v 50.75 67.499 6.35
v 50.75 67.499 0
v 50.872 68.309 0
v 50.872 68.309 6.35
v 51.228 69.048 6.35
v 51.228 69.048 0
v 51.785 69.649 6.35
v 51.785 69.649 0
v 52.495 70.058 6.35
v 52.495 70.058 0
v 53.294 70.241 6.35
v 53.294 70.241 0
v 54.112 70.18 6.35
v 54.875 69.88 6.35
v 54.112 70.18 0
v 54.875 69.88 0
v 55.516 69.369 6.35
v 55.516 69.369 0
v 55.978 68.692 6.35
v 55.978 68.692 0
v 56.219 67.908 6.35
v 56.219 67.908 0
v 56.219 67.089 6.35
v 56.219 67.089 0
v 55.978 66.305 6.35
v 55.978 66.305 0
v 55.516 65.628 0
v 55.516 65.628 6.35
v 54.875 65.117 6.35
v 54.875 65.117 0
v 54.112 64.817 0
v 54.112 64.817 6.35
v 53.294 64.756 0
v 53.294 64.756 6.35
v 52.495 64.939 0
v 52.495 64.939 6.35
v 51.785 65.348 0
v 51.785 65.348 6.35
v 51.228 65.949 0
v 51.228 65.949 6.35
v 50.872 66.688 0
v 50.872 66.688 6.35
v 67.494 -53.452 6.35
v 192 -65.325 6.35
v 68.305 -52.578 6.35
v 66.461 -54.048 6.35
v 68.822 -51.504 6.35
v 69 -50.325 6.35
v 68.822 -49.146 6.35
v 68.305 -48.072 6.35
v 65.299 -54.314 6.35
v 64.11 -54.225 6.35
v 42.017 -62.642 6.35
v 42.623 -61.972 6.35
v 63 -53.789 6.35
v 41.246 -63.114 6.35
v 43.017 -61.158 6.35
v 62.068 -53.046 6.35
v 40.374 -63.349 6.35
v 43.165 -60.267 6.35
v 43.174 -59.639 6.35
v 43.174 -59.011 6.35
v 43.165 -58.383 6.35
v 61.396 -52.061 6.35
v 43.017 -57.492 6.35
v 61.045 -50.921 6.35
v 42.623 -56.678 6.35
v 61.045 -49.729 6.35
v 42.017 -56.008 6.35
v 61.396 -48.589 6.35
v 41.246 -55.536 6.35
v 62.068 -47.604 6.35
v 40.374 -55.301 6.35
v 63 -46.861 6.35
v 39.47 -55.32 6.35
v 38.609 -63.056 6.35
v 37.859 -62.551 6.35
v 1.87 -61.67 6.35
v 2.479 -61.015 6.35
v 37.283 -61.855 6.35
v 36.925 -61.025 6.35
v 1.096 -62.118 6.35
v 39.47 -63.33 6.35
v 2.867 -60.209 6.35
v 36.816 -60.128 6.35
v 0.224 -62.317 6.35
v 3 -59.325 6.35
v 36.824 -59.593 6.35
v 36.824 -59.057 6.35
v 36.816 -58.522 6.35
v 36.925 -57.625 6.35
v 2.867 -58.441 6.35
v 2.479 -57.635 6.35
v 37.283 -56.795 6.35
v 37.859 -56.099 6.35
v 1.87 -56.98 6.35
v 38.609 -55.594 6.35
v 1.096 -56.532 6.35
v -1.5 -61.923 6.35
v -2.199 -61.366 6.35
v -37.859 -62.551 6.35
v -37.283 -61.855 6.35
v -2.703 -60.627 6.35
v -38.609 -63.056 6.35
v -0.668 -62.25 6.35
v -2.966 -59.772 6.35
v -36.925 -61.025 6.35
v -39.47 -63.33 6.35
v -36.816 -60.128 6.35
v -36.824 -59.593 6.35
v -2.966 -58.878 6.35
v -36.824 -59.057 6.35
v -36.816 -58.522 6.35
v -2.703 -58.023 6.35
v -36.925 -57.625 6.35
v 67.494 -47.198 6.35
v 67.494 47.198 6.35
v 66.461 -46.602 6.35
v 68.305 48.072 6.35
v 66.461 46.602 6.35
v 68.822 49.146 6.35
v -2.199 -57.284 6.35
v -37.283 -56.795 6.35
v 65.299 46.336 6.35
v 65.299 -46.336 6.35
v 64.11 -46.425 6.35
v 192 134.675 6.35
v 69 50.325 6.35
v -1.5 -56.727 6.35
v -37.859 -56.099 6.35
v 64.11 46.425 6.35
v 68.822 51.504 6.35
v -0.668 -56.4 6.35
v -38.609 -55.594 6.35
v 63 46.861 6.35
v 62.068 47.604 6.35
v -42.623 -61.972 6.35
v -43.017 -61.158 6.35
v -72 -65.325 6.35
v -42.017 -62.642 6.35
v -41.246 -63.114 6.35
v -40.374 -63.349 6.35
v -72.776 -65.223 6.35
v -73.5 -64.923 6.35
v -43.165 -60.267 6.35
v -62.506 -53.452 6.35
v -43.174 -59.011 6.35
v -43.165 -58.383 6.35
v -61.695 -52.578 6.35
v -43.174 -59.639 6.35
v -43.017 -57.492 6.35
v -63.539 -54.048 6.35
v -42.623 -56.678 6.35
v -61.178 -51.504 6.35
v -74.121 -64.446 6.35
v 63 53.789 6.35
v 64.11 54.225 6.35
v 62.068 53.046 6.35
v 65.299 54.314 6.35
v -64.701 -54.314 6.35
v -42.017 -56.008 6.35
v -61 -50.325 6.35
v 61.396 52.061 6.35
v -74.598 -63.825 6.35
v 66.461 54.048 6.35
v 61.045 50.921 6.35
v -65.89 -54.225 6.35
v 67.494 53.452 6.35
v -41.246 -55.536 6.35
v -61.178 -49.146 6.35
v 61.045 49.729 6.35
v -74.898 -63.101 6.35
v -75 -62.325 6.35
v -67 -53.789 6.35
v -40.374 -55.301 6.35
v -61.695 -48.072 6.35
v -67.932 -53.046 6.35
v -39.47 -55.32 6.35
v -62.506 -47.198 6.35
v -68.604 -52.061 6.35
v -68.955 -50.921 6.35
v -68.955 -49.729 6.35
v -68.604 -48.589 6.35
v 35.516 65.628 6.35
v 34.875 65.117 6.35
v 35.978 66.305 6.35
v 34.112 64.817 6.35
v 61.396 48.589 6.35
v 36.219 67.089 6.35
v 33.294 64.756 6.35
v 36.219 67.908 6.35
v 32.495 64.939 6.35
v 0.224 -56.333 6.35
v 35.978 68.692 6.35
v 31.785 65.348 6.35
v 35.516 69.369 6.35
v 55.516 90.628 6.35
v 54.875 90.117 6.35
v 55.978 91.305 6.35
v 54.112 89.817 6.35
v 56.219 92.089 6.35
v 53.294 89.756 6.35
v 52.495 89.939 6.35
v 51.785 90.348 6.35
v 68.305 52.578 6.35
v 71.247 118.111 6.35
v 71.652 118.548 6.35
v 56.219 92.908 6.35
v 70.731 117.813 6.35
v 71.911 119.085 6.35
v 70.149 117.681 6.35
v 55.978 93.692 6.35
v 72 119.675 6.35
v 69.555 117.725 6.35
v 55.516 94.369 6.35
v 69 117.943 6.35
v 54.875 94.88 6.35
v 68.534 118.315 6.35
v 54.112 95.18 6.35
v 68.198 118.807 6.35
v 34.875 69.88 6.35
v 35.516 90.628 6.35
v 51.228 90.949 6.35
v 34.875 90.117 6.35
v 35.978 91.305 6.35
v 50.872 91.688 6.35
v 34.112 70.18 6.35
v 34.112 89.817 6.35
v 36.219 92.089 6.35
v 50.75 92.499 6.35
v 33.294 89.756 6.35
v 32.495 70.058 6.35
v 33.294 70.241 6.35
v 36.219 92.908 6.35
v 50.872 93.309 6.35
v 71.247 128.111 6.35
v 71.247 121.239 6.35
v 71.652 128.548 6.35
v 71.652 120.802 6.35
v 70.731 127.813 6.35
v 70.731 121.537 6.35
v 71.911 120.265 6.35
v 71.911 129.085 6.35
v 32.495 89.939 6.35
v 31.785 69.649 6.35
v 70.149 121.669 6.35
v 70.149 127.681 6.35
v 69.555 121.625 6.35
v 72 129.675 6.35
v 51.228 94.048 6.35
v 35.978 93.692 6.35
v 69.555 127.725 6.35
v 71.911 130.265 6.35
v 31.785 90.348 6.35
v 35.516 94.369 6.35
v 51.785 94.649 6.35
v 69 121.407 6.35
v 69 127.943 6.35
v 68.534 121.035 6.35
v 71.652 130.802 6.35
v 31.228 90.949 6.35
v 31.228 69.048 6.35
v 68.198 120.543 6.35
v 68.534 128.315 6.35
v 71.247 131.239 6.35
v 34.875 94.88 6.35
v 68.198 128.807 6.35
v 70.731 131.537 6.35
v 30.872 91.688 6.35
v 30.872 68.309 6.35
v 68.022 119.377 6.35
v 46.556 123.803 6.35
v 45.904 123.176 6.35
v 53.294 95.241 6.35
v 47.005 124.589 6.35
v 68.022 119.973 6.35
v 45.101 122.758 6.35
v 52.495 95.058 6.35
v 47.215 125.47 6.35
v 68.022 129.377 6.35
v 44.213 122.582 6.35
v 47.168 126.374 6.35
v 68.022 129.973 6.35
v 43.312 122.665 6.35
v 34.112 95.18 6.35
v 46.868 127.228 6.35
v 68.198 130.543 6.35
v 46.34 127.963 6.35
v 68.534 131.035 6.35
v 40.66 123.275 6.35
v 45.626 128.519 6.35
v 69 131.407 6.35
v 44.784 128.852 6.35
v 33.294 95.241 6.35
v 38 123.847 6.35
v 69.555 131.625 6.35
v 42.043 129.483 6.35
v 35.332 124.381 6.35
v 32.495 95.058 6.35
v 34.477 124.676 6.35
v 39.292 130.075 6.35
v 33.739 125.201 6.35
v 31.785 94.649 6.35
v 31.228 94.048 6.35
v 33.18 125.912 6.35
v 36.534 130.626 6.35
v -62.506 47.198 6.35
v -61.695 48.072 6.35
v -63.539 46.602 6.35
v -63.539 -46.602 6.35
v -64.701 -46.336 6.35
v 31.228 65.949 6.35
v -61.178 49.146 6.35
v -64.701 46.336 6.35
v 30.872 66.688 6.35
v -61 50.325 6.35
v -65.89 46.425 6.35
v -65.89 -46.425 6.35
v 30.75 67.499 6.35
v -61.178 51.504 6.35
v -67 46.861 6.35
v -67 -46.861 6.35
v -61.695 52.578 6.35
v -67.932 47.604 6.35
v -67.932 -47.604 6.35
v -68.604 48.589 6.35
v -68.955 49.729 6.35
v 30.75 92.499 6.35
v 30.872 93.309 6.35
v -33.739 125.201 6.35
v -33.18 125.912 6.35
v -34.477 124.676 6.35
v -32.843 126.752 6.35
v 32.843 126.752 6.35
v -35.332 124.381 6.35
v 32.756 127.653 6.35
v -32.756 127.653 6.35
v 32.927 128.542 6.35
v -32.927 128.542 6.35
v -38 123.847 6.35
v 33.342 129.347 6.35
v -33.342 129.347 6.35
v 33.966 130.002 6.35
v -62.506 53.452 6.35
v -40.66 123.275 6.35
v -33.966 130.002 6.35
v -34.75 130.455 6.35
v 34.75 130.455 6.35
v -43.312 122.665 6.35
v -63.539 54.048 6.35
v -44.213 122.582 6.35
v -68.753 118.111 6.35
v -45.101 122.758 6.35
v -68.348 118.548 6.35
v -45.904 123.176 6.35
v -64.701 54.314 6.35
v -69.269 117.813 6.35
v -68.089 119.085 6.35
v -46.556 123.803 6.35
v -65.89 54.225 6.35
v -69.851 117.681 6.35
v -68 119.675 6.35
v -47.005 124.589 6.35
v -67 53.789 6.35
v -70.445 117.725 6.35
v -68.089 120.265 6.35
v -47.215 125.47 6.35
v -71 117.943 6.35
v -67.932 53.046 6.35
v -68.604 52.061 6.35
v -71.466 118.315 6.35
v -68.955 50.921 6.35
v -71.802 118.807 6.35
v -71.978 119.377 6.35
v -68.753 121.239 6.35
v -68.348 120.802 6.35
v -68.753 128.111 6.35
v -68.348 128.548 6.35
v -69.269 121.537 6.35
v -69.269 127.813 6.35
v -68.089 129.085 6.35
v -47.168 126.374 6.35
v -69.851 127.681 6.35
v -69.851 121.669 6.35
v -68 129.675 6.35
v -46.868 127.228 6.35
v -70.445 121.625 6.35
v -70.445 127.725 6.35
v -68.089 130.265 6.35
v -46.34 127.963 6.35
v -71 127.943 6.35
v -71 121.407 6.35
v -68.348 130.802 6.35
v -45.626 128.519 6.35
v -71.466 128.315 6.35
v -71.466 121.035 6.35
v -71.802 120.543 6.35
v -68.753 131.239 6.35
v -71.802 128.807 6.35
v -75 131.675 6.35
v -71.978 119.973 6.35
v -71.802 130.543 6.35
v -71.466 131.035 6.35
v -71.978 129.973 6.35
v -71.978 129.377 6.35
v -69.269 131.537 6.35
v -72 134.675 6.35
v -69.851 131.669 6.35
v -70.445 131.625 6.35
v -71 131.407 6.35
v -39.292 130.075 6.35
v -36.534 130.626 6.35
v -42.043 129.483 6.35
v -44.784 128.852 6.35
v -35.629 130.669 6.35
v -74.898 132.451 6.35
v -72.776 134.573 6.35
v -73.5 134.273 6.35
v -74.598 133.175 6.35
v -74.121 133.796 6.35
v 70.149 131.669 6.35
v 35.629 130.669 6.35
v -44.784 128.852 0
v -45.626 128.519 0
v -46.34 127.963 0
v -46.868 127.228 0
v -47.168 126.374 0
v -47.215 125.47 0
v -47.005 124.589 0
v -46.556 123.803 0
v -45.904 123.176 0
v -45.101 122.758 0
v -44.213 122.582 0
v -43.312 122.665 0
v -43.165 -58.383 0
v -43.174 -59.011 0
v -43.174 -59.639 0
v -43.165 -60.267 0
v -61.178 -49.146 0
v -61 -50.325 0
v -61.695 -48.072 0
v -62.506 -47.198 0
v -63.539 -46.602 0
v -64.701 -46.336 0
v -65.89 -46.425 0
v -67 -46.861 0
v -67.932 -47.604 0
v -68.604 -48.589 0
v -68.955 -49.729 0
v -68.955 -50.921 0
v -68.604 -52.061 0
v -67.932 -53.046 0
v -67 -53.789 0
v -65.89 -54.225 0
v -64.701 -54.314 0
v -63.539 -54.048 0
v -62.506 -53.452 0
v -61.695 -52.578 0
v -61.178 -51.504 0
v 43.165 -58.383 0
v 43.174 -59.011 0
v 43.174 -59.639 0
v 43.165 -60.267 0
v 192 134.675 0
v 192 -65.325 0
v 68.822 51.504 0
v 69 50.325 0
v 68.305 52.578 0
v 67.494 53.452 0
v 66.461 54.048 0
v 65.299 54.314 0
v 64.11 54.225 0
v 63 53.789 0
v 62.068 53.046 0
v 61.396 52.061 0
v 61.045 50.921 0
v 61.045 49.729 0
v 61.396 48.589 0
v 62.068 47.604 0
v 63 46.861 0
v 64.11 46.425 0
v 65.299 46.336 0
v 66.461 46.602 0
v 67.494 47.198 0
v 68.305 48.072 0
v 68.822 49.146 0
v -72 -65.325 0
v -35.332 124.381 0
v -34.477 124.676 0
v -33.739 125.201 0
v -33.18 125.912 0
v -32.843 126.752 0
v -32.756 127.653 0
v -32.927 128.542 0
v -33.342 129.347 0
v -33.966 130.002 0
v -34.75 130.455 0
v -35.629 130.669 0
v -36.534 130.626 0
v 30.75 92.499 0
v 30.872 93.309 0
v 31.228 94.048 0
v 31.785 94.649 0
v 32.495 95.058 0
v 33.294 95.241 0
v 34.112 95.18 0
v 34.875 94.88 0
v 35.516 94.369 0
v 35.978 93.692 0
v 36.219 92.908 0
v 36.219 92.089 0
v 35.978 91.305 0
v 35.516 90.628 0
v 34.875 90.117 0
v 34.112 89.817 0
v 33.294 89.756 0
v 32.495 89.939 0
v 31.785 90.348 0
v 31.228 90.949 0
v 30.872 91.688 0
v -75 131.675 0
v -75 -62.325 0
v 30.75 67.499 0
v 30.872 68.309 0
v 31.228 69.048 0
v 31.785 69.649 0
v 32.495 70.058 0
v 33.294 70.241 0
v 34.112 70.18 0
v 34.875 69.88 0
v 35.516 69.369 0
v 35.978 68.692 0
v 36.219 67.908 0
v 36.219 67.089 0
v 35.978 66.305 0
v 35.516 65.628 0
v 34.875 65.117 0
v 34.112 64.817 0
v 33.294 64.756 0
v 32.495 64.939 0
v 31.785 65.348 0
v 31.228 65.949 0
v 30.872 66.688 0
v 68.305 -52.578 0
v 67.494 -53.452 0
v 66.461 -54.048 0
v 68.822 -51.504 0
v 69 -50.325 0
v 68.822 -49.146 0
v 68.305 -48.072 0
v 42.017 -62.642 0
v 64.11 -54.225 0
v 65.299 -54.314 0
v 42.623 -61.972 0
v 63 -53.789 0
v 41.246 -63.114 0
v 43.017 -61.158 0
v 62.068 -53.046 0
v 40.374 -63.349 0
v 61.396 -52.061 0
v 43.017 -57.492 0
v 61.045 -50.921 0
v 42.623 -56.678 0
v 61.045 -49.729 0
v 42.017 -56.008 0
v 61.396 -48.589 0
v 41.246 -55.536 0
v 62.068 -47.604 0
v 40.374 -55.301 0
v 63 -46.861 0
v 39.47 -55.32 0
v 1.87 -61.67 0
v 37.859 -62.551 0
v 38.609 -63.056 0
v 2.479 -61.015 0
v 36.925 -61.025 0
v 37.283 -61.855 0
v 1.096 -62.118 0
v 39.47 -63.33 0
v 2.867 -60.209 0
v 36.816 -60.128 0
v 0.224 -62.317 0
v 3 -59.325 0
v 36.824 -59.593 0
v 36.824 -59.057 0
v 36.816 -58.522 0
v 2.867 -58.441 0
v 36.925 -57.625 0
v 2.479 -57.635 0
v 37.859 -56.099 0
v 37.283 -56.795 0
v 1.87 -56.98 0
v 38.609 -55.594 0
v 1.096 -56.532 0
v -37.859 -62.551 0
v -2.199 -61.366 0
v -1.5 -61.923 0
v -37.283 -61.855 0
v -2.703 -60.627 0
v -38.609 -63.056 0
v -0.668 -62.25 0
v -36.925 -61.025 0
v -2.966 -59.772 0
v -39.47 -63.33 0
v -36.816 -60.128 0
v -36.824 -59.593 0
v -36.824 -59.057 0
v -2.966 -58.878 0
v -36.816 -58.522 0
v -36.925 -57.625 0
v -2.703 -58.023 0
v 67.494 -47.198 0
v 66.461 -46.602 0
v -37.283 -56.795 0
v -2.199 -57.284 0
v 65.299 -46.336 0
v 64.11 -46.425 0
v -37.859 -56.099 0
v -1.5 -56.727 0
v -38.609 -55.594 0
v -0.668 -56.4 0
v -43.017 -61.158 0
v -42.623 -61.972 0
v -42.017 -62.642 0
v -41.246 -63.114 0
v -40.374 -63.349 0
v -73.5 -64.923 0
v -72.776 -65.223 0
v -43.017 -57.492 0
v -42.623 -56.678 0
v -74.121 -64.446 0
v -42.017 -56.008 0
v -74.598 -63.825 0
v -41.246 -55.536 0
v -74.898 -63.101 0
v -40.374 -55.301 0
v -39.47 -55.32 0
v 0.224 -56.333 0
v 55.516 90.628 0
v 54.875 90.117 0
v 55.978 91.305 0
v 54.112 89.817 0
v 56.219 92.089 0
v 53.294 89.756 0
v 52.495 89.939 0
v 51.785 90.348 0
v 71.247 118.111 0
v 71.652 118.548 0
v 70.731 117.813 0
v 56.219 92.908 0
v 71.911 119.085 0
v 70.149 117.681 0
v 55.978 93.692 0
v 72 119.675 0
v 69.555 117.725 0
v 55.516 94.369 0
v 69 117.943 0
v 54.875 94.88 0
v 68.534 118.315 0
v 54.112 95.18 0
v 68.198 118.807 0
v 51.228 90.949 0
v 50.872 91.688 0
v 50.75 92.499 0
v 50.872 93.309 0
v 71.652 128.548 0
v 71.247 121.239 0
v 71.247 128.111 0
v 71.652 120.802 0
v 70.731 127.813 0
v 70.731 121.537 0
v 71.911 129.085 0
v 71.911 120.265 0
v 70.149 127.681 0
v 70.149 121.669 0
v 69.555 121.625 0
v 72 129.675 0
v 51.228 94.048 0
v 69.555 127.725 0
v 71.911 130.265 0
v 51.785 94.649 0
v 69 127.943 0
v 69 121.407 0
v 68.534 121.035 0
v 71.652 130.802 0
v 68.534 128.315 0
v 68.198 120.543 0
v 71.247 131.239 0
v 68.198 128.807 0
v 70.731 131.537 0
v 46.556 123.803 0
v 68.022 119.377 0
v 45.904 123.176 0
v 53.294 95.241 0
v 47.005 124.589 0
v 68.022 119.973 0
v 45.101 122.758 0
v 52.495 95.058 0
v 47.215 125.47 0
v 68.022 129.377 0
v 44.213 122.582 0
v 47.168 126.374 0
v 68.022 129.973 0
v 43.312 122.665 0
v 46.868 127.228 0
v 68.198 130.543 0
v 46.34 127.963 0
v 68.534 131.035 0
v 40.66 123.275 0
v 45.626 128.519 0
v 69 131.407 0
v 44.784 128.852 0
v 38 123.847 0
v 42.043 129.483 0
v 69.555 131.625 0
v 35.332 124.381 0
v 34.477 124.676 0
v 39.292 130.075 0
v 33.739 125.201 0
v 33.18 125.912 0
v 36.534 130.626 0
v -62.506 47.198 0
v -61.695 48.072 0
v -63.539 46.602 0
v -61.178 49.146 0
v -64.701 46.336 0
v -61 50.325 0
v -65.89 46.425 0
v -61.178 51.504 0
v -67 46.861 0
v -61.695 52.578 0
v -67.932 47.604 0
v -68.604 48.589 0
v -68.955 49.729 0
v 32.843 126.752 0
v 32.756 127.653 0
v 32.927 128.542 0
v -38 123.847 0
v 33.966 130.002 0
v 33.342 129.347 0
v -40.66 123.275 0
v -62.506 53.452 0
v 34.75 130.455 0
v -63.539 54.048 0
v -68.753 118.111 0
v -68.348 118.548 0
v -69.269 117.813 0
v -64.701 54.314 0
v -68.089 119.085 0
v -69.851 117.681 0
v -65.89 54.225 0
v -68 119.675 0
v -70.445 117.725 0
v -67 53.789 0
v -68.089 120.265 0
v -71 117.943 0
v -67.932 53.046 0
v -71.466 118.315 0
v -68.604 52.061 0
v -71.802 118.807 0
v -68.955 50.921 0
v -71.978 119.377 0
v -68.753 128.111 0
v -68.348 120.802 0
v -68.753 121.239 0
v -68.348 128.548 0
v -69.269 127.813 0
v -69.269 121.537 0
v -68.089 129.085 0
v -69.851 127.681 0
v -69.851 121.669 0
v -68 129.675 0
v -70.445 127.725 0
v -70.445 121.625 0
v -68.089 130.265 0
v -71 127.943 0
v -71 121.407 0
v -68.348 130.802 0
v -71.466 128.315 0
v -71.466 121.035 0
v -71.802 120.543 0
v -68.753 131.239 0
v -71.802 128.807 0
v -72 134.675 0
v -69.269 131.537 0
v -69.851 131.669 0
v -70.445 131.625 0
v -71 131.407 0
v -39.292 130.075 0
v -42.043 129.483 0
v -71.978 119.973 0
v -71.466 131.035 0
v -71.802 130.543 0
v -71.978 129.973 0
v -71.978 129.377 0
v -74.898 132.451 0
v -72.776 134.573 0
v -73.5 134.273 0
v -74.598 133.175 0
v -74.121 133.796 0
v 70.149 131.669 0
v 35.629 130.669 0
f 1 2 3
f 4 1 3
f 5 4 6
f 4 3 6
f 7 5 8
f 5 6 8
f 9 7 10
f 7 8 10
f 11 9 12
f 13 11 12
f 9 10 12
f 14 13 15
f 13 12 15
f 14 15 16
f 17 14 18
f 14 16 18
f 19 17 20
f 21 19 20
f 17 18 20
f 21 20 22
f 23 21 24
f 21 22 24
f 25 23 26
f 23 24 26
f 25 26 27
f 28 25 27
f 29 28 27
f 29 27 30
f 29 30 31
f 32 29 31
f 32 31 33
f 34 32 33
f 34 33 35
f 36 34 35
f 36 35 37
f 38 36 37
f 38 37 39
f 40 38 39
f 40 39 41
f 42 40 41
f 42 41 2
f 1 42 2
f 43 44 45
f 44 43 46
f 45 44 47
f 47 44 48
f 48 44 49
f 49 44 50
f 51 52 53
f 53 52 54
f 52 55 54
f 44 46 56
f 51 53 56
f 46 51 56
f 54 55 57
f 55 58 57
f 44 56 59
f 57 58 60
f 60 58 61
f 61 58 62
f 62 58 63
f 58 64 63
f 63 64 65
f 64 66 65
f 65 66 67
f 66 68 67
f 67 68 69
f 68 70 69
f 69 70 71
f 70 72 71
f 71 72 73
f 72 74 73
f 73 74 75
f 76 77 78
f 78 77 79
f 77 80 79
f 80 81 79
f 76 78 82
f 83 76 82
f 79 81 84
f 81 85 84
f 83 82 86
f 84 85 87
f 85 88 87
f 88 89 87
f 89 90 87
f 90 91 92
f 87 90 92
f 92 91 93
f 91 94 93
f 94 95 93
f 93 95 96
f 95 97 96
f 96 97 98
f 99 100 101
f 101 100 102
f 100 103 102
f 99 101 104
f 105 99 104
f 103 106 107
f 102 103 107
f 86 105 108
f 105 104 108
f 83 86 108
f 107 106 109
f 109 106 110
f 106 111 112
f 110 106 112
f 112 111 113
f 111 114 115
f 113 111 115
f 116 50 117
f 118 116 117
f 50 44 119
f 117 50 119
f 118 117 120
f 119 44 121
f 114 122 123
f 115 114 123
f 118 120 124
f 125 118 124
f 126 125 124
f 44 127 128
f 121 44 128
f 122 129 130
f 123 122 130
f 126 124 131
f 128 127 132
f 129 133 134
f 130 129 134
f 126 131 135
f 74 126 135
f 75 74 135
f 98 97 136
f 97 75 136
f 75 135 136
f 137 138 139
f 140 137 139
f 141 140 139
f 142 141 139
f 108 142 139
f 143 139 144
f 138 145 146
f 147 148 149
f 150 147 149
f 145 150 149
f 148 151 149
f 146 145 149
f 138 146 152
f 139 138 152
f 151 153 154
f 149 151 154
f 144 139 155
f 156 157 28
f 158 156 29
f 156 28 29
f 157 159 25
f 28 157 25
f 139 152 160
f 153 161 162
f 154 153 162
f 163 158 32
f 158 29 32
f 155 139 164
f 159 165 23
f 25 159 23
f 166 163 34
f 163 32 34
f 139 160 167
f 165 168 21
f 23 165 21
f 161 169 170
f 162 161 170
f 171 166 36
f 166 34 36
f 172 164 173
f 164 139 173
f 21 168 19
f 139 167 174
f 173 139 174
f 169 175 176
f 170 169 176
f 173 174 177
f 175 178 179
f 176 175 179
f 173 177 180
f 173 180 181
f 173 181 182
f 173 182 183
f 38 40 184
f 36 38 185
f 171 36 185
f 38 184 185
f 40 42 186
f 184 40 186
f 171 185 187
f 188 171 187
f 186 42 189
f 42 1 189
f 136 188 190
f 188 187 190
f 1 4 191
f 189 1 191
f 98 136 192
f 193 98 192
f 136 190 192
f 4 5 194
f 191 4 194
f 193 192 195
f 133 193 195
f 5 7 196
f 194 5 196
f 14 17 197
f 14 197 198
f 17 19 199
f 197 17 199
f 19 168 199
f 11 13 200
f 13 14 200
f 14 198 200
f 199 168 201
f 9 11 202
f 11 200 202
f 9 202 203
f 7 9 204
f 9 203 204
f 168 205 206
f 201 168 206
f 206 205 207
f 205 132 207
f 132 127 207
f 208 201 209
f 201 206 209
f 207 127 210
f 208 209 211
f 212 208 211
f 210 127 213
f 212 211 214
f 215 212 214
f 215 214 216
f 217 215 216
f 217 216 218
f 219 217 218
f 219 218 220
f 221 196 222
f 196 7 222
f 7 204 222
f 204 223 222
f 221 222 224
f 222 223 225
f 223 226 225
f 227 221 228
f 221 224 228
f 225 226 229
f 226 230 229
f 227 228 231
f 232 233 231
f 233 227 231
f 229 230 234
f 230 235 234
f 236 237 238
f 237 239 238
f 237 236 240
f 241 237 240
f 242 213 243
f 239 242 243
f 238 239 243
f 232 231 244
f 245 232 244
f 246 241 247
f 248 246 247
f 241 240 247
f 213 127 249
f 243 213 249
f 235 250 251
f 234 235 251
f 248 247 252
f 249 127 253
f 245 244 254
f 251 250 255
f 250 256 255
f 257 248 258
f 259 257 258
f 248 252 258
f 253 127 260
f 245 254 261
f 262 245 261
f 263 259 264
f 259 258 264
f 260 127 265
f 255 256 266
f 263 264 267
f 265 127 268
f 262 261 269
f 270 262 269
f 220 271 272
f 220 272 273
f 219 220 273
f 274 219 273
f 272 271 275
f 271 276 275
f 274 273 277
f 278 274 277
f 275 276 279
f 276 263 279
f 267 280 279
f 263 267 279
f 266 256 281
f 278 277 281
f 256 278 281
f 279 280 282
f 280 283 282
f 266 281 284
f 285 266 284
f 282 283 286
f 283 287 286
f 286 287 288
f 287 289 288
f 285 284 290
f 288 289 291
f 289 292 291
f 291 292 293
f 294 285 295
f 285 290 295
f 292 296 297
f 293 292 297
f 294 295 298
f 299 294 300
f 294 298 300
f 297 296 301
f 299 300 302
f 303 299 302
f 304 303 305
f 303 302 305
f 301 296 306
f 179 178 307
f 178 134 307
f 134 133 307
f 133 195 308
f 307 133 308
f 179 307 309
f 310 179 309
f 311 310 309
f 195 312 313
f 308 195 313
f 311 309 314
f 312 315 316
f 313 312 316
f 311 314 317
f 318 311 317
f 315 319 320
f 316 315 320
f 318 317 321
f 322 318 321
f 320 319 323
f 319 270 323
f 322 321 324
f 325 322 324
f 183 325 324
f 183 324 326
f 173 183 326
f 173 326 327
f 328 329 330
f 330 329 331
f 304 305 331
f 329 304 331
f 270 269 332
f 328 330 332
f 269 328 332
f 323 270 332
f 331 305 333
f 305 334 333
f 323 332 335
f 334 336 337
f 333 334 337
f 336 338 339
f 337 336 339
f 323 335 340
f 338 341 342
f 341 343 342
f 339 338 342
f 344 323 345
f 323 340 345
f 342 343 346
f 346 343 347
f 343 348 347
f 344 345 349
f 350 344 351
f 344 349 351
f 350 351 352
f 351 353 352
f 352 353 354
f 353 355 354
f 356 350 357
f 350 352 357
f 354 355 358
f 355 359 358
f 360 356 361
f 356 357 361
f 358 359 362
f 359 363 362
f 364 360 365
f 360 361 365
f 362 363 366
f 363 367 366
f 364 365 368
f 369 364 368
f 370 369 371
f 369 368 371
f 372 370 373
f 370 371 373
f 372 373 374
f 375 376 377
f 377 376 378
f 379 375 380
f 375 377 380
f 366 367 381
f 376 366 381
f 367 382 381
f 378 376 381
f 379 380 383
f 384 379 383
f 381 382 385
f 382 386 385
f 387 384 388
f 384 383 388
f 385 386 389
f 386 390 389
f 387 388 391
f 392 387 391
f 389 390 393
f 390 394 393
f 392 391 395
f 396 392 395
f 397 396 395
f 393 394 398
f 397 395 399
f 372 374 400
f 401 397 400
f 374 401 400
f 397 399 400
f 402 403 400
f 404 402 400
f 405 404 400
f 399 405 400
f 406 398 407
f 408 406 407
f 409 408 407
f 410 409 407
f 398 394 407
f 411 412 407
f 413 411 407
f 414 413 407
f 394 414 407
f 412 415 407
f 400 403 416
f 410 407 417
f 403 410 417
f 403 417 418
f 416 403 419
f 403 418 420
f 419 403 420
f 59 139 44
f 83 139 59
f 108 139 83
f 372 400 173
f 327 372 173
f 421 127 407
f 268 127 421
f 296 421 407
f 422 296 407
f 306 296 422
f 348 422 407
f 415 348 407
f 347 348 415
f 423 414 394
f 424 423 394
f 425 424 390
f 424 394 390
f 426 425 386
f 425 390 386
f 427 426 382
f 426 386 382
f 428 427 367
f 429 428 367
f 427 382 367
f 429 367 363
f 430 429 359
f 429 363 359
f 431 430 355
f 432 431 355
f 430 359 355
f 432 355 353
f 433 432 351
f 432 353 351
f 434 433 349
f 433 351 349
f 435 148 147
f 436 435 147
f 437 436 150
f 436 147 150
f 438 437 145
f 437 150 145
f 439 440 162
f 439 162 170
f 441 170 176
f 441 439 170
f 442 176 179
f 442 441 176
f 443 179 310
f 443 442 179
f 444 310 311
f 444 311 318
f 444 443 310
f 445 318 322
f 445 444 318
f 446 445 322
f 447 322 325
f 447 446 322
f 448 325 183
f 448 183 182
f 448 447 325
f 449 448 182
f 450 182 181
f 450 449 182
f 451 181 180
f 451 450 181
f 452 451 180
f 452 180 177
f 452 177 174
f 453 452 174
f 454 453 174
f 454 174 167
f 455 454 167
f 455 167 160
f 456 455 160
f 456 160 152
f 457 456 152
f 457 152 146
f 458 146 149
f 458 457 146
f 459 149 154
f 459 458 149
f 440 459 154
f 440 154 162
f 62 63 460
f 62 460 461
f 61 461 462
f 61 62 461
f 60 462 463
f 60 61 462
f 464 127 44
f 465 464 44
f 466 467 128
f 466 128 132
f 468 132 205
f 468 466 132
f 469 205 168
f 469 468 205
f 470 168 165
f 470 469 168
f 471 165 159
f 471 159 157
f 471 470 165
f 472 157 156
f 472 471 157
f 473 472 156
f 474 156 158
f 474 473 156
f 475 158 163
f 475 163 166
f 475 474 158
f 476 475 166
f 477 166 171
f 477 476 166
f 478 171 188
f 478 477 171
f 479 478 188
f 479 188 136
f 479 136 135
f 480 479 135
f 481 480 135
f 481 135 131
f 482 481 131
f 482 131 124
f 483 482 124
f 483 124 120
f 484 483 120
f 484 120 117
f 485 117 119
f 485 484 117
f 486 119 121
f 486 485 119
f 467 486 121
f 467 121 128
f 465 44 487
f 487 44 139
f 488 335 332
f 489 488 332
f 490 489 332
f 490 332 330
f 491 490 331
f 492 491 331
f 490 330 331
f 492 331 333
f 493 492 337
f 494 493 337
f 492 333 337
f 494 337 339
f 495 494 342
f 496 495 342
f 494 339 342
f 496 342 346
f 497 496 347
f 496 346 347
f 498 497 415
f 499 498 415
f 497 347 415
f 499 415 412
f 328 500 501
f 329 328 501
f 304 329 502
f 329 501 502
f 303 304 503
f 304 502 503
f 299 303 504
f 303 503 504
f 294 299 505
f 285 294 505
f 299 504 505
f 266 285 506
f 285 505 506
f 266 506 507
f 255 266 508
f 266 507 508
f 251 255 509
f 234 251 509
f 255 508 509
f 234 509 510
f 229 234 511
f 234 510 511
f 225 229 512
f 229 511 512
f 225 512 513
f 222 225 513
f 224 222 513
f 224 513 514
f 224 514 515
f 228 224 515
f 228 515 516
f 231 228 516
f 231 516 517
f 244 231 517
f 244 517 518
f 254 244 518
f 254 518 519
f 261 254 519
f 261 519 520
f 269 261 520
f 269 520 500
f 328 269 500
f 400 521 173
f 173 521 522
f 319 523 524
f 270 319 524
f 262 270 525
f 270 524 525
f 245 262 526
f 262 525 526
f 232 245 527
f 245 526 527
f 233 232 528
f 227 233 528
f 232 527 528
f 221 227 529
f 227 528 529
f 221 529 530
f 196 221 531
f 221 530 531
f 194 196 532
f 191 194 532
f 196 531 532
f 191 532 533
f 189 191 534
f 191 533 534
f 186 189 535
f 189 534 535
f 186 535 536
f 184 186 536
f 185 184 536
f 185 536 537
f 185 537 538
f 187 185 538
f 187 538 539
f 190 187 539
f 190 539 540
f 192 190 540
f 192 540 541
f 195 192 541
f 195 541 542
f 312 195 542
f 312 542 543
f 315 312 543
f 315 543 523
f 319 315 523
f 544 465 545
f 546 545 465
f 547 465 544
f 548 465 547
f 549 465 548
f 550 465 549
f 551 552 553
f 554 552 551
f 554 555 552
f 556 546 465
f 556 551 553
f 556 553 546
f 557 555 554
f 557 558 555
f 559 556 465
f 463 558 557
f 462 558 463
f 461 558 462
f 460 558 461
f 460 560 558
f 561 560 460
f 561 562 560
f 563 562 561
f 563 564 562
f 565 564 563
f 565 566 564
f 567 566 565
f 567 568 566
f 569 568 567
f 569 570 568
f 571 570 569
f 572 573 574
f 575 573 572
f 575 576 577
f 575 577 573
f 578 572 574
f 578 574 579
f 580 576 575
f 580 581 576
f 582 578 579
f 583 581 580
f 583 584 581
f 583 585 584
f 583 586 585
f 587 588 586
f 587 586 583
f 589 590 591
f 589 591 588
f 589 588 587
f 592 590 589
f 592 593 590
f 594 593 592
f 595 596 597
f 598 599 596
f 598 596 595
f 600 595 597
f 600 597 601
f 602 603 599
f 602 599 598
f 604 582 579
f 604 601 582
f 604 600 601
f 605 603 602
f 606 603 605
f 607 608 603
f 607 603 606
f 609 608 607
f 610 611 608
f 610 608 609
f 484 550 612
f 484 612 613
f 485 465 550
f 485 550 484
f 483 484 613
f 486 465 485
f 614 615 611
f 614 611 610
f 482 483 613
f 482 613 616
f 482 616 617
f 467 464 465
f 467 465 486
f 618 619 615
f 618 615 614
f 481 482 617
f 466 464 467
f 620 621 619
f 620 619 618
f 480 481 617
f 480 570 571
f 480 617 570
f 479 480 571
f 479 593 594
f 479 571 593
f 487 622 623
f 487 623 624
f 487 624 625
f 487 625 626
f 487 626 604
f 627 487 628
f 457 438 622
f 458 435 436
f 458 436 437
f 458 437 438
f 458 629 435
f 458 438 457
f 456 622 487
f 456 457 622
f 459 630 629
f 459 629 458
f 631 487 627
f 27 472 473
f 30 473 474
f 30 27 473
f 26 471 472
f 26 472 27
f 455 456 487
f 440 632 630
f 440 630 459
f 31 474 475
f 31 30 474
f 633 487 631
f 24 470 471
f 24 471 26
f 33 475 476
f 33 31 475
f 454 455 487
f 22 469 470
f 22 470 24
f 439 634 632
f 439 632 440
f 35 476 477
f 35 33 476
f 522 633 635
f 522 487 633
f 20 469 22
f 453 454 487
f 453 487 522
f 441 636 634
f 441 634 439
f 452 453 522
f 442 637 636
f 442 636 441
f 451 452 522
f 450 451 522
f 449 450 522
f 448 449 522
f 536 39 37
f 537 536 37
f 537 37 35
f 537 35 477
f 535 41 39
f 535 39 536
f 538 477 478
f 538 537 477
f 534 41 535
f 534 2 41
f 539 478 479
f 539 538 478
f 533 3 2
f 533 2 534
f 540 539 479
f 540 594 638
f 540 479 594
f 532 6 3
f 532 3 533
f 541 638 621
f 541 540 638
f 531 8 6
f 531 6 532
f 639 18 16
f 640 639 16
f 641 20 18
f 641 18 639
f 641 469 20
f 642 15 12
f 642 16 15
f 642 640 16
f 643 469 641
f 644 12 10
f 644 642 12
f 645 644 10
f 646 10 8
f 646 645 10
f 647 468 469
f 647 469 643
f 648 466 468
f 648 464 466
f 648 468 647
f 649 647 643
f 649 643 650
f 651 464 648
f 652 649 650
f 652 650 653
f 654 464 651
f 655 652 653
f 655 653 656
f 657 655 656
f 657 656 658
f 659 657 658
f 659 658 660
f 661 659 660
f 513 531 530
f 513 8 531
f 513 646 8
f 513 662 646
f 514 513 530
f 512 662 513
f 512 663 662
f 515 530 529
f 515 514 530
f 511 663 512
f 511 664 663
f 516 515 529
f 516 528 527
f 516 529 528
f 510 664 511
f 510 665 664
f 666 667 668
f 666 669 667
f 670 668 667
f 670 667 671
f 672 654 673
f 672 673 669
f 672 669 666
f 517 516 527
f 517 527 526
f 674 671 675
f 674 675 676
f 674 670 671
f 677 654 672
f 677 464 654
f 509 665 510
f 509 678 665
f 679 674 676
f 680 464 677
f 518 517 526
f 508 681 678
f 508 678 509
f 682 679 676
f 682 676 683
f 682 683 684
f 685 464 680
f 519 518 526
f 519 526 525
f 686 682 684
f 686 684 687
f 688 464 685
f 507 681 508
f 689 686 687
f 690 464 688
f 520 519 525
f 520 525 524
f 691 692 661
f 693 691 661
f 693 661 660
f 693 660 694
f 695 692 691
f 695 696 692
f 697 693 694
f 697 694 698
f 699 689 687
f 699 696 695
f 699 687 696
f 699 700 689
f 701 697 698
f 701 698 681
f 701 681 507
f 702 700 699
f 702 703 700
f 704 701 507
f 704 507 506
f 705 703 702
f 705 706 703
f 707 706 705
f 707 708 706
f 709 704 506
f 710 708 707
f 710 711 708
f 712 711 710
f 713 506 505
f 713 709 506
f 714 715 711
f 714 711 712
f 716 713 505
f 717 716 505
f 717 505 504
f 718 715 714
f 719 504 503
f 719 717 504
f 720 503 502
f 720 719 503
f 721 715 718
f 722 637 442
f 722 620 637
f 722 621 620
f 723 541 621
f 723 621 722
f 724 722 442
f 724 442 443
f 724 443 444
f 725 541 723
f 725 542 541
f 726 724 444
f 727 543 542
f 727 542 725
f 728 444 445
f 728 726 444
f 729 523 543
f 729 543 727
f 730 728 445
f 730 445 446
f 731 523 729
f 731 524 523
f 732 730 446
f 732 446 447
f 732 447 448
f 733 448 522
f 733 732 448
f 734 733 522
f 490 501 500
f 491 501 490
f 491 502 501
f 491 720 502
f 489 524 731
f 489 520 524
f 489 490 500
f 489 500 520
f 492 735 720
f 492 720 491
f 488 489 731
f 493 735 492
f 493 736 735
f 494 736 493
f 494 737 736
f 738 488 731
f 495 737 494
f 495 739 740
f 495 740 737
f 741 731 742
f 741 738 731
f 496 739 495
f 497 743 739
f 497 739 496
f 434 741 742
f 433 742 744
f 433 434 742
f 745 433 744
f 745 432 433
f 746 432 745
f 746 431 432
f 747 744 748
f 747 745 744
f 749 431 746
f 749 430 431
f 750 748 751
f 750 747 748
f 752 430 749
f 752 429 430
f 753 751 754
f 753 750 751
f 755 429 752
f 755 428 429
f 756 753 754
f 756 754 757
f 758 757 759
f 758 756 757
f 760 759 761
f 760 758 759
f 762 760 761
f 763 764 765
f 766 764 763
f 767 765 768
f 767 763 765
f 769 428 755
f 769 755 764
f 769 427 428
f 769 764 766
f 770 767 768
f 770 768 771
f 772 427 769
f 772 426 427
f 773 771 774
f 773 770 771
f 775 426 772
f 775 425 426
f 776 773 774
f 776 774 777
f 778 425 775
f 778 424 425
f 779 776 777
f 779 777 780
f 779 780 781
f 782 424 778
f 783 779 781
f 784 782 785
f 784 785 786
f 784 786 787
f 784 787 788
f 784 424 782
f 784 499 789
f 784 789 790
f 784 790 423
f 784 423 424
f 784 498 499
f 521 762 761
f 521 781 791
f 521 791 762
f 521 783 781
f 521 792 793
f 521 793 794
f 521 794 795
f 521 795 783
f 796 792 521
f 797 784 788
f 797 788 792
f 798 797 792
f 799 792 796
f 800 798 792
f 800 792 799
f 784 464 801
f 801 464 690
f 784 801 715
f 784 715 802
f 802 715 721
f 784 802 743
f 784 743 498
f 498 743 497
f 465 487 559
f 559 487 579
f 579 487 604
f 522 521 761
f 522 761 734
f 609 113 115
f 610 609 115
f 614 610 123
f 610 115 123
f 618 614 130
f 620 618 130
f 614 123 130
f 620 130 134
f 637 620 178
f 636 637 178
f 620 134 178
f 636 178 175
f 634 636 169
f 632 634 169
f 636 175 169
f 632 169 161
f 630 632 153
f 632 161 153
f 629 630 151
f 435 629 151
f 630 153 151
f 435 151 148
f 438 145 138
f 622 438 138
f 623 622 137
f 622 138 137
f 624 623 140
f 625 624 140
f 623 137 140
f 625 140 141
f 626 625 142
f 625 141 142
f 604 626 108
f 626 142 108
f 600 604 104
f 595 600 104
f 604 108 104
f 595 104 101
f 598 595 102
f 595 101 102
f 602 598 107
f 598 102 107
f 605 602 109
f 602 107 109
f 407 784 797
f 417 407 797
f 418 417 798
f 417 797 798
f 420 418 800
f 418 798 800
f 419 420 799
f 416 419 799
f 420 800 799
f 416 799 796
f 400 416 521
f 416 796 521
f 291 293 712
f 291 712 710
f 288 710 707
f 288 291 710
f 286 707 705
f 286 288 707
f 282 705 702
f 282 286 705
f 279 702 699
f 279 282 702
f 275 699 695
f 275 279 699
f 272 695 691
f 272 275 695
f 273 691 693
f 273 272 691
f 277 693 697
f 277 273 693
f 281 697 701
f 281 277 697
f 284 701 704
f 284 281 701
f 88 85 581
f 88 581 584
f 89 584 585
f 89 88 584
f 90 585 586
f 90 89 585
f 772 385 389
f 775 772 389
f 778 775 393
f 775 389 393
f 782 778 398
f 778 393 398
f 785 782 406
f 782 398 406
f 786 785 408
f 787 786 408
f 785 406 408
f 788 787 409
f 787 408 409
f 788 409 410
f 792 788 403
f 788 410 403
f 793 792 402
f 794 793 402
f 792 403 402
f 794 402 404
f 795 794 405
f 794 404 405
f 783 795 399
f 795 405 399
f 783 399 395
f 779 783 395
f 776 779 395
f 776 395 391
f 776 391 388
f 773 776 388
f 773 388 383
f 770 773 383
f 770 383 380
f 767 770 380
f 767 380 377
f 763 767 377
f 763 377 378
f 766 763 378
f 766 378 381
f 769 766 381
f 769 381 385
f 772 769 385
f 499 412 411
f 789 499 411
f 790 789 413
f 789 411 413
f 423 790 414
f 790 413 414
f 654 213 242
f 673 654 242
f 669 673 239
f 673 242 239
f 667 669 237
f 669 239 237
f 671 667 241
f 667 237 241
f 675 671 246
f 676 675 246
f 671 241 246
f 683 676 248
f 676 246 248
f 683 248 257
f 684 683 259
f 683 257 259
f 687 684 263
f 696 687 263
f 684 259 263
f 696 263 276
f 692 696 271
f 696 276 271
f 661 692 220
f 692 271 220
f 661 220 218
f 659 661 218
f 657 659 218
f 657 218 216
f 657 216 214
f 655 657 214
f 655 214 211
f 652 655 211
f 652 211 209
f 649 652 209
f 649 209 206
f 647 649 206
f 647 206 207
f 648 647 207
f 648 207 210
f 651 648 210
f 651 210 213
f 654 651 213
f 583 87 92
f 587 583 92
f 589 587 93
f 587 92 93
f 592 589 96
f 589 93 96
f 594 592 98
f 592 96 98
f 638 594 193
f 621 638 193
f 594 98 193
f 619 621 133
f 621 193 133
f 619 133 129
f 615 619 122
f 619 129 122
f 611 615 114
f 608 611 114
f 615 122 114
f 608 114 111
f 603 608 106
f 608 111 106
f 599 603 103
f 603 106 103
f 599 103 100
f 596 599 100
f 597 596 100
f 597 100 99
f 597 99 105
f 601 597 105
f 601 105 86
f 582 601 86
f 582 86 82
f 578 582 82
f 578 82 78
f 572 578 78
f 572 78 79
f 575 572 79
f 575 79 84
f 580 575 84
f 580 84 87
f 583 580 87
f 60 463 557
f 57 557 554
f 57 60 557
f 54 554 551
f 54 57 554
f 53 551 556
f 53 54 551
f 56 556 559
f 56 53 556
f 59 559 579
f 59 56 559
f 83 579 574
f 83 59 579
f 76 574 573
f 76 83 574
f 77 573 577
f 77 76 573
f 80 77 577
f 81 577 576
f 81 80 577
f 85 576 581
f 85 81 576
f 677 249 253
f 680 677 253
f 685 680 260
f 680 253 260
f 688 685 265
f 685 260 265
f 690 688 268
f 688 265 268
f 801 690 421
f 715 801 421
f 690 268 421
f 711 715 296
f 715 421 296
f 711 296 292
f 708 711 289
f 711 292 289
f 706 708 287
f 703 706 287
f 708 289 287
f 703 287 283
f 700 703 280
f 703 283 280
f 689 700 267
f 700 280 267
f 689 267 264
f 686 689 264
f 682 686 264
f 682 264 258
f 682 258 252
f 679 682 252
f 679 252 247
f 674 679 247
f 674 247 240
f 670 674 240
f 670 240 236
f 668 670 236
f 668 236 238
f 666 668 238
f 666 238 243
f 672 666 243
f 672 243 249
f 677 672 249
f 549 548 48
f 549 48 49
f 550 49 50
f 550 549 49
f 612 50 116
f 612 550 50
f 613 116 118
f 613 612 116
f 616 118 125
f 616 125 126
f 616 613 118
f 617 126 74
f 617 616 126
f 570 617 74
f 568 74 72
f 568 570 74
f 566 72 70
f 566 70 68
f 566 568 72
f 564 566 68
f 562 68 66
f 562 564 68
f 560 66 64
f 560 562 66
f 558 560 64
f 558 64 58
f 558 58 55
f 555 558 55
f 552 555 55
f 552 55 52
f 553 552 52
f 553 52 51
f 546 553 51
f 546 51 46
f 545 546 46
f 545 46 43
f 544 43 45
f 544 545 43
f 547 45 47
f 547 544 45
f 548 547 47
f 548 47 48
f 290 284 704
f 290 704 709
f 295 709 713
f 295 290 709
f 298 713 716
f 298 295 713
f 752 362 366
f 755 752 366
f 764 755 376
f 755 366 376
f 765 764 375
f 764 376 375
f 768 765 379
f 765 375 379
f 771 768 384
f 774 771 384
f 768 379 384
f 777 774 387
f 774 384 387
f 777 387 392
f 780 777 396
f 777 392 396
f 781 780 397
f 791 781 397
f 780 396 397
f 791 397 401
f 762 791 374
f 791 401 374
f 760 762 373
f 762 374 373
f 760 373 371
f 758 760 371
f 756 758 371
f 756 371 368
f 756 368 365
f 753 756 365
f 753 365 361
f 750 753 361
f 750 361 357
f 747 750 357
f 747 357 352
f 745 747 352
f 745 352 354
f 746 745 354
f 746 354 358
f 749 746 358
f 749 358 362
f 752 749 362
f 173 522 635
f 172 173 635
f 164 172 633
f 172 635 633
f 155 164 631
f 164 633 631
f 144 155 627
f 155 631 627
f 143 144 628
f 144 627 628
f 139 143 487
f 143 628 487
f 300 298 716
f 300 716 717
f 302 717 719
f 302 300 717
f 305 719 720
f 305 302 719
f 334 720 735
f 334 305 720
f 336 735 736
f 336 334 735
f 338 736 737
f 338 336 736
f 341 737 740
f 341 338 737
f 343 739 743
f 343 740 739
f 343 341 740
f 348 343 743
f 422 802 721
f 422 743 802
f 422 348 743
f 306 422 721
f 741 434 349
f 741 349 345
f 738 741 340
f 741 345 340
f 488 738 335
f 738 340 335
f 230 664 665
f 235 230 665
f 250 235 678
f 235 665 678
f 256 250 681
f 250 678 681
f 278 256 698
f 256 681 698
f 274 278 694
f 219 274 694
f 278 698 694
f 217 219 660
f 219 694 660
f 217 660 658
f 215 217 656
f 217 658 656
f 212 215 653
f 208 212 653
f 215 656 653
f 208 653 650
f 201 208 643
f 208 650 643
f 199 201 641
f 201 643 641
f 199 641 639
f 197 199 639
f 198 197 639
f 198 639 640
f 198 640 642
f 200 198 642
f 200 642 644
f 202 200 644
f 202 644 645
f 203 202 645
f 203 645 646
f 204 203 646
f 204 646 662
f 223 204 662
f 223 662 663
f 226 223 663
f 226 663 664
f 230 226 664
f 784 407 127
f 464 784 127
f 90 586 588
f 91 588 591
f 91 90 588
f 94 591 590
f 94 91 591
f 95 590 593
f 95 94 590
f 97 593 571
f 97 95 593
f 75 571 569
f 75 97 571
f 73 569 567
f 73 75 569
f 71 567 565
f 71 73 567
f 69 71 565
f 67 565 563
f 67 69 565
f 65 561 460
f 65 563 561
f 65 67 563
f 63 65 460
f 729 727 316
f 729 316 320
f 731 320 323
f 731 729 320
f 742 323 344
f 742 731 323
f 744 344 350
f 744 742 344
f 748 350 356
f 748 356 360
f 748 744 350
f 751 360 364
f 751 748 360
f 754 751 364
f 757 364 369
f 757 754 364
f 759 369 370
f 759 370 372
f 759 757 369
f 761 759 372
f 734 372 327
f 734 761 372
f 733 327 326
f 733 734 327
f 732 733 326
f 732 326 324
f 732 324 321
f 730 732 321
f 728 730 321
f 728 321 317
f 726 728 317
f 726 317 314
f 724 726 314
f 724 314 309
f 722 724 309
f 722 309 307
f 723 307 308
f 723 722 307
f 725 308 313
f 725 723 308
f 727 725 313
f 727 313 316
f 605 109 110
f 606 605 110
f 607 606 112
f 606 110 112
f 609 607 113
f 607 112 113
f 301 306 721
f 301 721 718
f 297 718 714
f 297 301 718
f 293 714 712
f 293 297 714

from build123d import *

# Parameters (mm, degrees)
SKETCH1_R           = 4
BOSS_EXTRUDE1_DEPTH = 6.35
SKETCH2_R           = 3
CUT_EXTRUDE1_DEPTH  = 10
SKETCH3_R           = 2
CUT_EXTRUDE2_DEPTH  = 7.35
SKETCH4_R           = 2.75
CUT_EXTRUDE3_DEPTH  = 10
BOSS_EXTRUDE2_DEPTH = 6.35


with BuildPart() as part:
    # Sketch1 → Boss-Extrude1 (new body)
    with BuildSketch(Plane.XY):
        with BuildLine():
            Line((72, 134.675), (-72, 134.675))
            ThreePointArc((-72, 134.675), (-74.121320344, 133.796320344), (-75, 131.675))
            Line((-75, 131.675), (-75, -62.325))
            ThreePointArc((-75, -62.325), (-74.121320344, -64.446320344), (-72, -65.325))
            Line((-72, -65.325), (72, -65.325))
            ThreePointArc((72, -65.325), (74.121320344, -64.446320344), (75, -62.325))
            Line((75, -62.325), (75, 131.675))
            ThreePointArc((75, 131.675), (74.121320344, 133.796320344), (72, 134.675))
        make_face()
        with Locations((-65, 50.325)):
            Circle(SKETCH1_R, mode=Mode.SUBTRACT)
        with Locations((-65, -50.325)):
            Circle(SKETCH1_R, mode=Mode.SUBTRACT)
        with Locations((65, -50.325)):
            Circle(SKETCH1_R, mode=Mode.SUBTRACT)
        with Locations((65, 50.325)):
            Circle(SKETCH1_R, mode=Mode.SUBTRACT)
    extrude(amount=BOSS_EXTRUDE1_DEPTH)

    # Sketch2 → Cut-Extrude1 (cut)
    with BuildSketch(Plane.XY.offset(6.35)):
        with Locations((0, -59.325)):
            Circle(SKETCH2_R)
        with BuildLine():
            ThreePointArc((-36.53351789, 130.62609934), (-40.668585297, 129.78392163), (-44.784296659, 128.851738315))
            ThreePointArc((-44.784296659, 128.851738315), (-47.141646379, 125.021894676), (-43.31180274, 122.664544956))
            ThreePointArc((-43.31180274, 122.664544956), (-39.331414703, 123.56607837), (-35.332307043, 124.380565536))
            ThreePointArc((-35.332307043, 124.380565536), (-32.810145565, 128.103937862), (-36.53351789, 130.62609934))
        make_face()
        with BuildLine():
            ThreePointArc((-43.164725519, -58.383142339), (-43.175, -59.325), (-43.164725519, -60.266857661))
            ThreePointArc((-43.164725519, -60.266857661), (-39.921218823, -63.371839837), (-36.816236647, -60.128333141))
            ThreePointArc((-36.816236647, -60.128333141), (-36.825, -59.325), (-36.816236647, -58.521666859))
            ThreePointArc((-36.816236647, -58.521666859), (-39.921218823, -55.278160163), (-43.164725519, -58.383142339))
        make_face()
        with BuildLine():
            ThreePointArc((36.53351789, 130.62609934), (40.668585297, 129.78392163), (44.784296659, 128.851738315))
            ThreePointArc((44.784296659, 128.851738315), (47.141646379, 125.021894676), (43.31180274, 122.664544956))
            ThreePointArc((43.31180274, 122.664544956), (39.331414703, 123.56607837), (35.332307043, 124.380565536))
            ThreePointArc((35.332307043, 124.380565536), (32.810145565, 128.103937862), (36.53351789, 130.62609934))
        make_face()
        with BuildLine():
            ThreePointArc((43.164725519, -58.383142339), (43.175, -59.325), (43.164725519, -60.266857661))
            ThreePointArc((43.164725519, -60.266857661), (39.921218823, -63.371839837), (36.816236647, -60.128333141))
            ThreePointArc((36.816236647, -60.128333141), (36.825, -59.325), (36.816236647, -58.521666859))
            ThreePointArc((36.816236647, -58.521666859), (39.921218823, -55.278160163), (43.164725519, -58.383142339))
        make_face()
    extrude(amount=-CUT_EXTRUDE1_DEPTH, mode=Mode.SUBTRACT)

    # Sketch3 → Cut-Extrude2 (cut, through all)
    with BuildSketch(Plane.XY.offset(6.35)):
        with Locations((-70, 129.675)):
            Circle(SKETCH3_R)
        with Locations((-70, 119.675)):
            Circle(SKETCH3_R)
        with Locations((70, 119.675)):
            Circle(SKETCH3_R)
        with Locations((70, 129.675)):
            Circle(SKETCH3_R)
    extrude(amount=-CUT_EXTRUDE2_DEPTH, mode=Mode.SUBTRACT)

    # Sketch4 → Cut-Extrude3 (cut)
    with BuildSketch(Plane(origin=(-33.865437688, -165.327994616, 0), x_dir=(-1, 0, 0), z_dir=(0, 0, -1))):
        with Locations((-67.365437688, 232.826497308)):
            Circle(SKETCH4_R)
        with Locations((-87.365437688, 232.826497308)):
            Circle(SKETCH4_R)
        with Locations((-87.365437688, 257.826497308)):
            Circle(SKETCH4_R)
        with Locations((-67.365437688, 257.826497308)):
            Circle(SKETCH4_R)
    extrude(amount=-CUT_EXTRUDE3_DEPTH, mode=Mode.SUBTRACT)

    # Sketch5 → Boss-Extrude2 (add)
    with BuildSketch(Plane.XY.offset(6.35)):
        with BuildLine():
            Line((72, 134.675), (192, 134.675))
            Line((192, 134.675), (192, -65.325))
            Line((192, -65.325), (72, -65.325))
            ThreePointArc((72, -65.325), (74.121320344, -64.446320344), (75, -62.325))
            Line((75, -62.325), (75, 131.675))
            ThreePointArc((75, 131.675), (74.121320344, 133.796320344), (72, 134.675))
        make_face()
    extrude(amount=-BOSS_EXTRUDE2_DEPTH)


solid = part.part
